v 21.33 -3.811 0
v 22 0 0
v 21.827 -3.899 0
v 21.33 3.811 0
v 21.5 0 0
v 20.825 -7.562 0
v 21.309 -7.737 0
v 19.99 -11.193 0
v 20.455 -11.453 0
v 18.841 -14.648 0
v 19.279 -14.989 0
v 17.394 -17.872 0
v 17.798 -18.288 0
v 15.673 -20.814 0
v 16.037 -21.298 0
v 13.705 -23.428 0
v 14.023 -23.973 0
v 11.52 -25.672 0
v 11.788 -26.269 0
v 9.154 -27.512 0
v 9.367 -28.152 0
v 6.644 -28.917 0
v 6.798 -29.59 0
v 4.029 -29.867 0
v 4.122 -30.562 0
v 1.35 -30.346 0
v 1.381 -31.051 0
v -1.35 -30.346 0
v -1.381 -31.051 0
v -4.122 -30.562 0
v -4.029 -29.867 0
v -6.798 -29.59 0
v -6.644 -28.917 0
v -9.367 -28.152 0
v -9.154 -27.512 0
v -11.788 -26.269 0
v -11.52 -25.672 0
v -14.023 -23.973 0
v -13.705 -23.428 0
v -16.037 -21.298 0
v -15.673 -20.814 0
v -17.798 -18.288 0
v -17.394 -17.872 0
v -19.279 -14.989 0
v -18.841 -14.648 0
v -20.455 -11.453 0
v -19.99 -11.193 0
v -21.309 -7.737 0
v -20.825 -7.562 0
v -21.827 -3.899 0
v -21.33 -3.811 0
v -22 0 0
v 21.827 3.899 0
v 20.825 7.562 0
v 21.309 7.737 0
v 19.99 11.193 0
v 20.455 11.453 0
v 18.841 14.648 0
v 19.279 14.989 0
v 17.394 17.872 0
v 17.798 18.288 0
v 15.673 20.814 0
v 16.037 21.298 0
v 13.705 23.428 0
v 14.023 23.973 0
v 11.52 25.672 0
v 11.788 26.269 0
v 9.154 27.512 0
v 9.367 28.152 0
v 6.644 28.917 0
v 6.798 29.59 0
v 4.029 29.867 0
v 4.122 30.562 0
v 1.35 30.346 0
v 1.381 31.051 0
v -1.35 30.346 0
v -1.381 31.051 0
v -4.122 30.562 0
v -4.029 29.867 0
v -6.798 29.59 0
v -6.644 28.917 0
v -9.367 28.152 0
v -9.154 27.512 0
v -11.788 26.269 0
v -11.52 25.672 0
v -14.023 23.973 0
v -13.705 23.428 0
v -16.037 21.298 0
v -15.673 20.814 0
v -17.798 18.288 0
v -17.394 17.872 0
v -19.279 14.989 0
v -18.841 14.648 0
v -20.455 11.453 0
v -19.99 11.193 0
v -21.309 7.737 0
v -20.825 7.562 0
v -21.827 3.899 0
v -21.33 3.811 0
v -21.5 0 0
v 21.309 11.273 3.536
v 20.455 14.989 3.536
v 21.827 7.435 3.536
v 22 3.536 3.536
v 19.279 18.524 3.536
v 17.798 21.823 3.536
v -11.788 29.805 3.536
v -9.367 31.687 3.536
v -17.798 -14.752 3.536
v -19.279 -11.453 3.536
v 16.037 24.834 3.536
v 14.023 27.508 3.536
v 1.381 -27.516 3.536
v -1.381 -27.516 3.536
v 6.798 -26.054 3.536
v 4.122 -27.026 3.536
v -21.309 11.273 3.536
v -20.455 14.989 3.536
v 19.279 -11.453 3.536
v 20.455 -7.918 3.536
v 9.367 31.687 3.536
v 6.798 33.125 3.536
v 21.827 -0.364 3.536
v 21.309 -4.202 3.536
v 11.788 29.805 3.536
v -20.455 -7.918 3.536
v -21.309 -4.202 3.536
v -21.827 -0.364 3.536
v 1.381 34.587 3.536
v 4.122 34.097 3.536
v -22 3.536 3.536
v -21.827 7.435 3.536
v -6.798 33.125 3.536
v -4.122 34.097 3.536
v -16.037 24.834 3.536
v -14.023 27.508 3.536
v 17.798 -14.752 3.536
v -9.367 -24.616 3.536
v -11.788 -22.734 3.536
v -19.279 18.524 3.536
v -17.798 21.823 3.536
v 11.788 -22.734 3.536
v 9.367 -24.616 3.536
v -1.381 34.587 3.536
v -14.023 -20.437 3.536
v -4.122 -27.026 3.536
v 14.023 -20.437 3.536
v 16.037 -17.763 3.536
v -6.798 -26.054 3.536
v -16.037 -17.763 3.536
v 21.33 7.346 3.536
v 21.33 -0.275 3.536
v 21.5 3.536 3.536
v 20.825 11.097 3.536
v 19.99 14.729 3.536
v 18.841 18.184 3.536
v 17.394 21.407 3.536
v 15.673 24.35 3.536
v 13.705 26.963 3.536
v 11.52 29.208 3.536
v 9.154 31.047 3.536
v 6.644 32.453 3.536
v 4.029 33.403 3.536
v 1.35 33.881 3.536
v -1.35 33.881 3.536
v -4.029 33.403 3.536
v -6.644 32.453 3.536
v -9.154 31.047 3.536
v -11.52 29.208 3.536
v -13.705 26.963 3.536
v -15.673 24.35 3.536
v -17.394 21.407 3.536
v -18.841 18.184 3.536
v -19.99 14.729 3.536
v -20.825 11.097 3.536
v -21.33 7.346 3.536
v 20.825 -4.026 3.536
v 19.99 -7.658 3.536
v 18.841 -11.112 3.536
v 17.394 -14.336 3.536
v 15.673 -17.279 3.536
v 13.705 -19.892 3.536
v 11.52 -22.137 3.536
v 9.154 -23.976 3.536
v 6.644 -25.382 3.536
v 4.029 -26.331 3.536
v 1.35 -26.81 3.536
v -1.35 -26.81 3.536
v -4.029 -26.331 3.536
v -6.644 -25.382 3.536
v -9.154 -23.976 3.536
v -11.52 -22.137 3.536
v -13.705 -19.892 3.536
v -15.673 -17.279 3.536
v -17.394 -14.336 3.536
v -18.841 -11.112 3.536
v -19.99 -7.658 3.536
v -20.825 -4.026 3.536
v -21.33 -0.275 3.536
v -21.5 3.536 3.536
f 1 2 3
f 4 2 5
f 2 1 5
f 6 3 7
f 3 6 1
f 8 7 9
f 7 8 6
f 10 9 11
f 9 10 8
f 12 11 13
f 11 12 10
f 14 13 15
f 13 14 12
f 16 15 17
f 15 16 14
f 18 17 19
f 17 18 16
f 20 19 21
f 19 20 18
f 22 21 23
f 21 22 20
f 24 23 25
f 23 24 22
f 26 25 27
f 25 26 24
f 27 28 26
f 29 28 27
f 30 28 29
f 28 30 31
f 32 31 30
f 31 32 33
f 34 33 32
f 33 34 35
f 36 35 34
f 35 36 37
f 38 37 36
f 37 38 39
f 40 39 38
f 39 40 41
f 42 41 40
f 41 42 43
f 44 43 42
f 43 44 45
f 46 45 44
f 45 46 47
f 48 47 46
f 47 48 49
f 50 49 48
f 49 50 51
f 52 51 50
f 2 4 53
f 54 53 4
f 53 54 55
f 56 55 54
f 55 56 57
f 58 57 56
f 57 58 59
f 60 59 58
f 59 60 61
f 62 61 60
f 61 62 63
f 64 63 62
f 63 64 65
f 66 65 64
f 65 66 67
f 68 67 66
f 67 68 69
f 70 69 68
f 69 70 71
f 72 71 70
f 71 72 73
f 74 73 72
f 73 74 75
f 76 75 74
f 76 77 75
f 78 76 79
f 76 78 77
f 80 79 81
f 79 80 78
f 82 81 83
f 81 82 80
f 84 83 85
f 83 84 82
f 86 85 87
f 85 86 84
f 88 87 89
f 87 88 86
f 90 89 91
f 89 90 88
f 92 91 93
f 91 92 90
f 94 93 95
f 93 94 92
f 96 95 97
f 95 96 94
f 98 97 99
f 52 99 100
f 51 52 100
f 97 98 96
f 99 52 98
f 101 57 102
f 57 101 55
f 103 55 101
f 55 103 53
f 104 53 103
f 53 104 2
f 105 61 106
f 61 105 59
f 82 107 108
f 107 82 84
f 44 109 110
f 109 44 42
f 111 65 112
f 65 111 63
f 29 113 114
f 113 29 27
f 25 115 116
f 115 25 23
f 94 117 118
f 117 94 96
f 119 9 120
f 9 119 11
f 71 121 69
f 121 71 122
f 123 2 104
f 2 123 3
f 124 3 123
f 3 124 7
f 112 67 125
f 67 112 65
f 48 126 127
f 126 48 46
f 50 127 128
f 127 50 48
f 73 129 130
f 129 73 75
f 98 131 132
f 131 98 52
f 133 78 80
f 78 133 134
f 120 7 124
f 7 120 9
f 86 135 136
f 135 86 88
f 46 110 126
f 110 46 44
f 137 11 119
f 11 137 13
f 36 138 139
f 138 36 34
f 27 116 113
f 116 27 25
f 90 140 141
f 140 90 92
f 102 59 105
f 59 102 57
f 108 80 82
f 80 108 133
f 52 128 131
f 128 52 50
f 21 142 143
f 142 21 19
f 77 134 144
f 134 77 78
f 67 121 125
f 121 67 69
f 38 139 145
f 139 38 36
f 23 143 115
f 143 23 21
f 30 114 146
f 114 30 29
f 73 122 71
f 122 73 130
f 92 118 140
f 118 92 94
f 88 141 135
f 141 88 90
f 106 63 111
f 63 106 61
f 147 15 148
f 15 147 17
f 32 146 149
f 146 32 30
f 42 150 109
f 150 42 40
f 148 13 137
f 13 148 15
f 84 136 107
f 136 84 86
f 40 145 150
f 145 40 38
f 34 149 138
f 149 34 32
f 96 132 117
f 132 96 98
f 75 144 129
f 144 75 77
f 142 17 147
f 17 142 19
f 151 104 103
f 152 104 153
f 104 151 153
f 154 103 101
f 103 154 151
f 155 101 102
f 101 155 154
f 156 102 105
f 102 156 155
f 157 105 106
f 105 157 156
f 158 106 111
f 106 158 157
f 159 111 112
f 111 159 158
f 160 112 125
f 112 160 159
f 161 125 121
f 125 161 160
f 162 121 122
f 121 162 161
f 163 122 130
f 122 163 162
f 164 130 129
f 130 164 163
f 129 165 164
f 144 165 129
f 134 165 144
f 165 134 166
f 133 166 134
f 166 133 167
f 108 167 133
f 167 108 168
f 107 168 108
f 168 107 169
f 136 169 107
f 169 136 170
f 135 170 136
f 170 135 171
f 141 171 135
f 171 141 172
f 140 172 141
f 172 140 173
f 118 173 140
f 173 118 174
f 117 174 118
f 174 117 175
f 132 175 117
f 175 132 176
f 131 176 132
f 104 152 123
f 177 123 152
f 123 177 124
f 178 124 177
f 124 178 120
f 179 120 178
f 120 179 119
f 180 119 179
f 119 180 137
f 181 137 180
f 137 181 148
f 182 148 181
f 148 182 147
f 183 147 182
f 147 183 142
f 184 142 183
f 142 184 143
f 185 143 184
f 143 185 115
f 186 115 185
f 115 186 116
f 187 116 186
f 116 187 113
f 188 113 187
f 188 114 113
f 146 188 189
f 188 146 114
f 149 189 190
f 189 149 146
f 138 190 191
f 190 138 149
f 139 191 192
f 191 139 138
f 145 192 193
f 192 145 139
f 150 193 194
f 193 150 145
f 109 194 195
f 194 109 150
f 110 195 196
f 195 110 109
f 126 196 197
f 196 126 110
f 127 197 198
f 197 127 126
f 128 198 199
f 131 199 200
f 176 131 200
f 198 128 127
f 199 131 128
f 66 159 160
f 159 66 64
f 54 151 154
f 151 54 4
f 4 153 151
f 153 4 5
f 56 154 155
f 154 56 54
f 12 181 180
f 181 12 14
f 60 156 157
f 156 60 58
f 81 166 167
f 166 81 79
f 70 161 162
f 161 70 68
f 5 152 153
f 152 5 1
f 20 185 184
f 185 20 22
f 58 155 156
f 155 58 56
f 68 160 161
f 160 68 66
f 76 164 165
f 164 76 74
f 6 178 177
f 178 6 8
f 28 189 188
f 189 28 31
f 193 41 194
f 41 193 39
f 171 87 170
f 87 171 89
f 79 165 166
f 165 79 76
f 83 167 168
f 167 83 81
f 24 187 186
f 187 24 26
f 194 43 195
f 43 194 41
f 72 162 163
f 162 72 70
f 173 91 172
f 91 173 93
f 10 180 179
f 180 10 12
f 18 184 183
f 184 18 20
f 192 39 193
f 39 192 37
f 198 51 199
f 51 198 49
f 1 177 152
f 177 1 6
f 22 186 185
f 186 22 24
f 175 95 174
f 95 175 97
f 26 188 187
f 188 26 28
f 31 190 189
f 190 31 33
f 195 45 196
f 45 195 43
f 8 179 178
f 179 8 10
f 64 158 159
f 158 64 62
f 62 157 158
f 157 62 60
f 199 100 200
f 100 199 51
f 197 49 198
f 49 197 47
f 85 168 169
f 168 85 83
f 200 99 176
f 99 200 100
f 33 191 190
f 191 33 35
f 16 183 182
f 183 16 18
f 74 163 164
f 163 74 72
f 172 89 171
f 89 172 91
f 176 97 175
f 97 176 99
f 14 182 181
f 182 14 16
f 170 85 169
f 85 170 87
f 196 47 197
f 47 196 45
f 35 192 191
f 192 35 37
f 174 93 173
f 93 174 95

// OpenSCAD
secondary_mirror_hole=43;
secondary_mirror_larger=44;
secondary_mirror_thickness=5;
$fn=50;

rotate([-45,0,0]){
difference() {
difference() {
intersection() {
	rotate([45,0,0]) {
		cylinder(r=secondary_mirror_larger*4, h=secondary_mirror_larger*4);
	}
	translate([0,0,-secondary_mirror_larger/2-secondary_mirror_thickness]){
	cylinder(r=secondary_mirror_larger/2, h=secondary_mirror_larger*4);
	}
}
translate([0,0,secondary_mirror_thickness]){
intersection() {
	rotate([45,0,0]) {
		cylinder(r=secondary_mirror_larger*4, h=secondary_mirror_larger*4);
	}
	translate([0,0,-secondary_mirror_larger/2]){
	cylinder(r=secondary_mirror_larger/2+0.01, h=secondary_mirror_larger*4);
	}
}
}
}
	translate([0,0,-secondary_mirror_larger/2-secondary_mirror_thickness]){
			cylinder(r=secondary_mirror_hole/2, h=secondary_mirror_larger*4);
	}
}
}
